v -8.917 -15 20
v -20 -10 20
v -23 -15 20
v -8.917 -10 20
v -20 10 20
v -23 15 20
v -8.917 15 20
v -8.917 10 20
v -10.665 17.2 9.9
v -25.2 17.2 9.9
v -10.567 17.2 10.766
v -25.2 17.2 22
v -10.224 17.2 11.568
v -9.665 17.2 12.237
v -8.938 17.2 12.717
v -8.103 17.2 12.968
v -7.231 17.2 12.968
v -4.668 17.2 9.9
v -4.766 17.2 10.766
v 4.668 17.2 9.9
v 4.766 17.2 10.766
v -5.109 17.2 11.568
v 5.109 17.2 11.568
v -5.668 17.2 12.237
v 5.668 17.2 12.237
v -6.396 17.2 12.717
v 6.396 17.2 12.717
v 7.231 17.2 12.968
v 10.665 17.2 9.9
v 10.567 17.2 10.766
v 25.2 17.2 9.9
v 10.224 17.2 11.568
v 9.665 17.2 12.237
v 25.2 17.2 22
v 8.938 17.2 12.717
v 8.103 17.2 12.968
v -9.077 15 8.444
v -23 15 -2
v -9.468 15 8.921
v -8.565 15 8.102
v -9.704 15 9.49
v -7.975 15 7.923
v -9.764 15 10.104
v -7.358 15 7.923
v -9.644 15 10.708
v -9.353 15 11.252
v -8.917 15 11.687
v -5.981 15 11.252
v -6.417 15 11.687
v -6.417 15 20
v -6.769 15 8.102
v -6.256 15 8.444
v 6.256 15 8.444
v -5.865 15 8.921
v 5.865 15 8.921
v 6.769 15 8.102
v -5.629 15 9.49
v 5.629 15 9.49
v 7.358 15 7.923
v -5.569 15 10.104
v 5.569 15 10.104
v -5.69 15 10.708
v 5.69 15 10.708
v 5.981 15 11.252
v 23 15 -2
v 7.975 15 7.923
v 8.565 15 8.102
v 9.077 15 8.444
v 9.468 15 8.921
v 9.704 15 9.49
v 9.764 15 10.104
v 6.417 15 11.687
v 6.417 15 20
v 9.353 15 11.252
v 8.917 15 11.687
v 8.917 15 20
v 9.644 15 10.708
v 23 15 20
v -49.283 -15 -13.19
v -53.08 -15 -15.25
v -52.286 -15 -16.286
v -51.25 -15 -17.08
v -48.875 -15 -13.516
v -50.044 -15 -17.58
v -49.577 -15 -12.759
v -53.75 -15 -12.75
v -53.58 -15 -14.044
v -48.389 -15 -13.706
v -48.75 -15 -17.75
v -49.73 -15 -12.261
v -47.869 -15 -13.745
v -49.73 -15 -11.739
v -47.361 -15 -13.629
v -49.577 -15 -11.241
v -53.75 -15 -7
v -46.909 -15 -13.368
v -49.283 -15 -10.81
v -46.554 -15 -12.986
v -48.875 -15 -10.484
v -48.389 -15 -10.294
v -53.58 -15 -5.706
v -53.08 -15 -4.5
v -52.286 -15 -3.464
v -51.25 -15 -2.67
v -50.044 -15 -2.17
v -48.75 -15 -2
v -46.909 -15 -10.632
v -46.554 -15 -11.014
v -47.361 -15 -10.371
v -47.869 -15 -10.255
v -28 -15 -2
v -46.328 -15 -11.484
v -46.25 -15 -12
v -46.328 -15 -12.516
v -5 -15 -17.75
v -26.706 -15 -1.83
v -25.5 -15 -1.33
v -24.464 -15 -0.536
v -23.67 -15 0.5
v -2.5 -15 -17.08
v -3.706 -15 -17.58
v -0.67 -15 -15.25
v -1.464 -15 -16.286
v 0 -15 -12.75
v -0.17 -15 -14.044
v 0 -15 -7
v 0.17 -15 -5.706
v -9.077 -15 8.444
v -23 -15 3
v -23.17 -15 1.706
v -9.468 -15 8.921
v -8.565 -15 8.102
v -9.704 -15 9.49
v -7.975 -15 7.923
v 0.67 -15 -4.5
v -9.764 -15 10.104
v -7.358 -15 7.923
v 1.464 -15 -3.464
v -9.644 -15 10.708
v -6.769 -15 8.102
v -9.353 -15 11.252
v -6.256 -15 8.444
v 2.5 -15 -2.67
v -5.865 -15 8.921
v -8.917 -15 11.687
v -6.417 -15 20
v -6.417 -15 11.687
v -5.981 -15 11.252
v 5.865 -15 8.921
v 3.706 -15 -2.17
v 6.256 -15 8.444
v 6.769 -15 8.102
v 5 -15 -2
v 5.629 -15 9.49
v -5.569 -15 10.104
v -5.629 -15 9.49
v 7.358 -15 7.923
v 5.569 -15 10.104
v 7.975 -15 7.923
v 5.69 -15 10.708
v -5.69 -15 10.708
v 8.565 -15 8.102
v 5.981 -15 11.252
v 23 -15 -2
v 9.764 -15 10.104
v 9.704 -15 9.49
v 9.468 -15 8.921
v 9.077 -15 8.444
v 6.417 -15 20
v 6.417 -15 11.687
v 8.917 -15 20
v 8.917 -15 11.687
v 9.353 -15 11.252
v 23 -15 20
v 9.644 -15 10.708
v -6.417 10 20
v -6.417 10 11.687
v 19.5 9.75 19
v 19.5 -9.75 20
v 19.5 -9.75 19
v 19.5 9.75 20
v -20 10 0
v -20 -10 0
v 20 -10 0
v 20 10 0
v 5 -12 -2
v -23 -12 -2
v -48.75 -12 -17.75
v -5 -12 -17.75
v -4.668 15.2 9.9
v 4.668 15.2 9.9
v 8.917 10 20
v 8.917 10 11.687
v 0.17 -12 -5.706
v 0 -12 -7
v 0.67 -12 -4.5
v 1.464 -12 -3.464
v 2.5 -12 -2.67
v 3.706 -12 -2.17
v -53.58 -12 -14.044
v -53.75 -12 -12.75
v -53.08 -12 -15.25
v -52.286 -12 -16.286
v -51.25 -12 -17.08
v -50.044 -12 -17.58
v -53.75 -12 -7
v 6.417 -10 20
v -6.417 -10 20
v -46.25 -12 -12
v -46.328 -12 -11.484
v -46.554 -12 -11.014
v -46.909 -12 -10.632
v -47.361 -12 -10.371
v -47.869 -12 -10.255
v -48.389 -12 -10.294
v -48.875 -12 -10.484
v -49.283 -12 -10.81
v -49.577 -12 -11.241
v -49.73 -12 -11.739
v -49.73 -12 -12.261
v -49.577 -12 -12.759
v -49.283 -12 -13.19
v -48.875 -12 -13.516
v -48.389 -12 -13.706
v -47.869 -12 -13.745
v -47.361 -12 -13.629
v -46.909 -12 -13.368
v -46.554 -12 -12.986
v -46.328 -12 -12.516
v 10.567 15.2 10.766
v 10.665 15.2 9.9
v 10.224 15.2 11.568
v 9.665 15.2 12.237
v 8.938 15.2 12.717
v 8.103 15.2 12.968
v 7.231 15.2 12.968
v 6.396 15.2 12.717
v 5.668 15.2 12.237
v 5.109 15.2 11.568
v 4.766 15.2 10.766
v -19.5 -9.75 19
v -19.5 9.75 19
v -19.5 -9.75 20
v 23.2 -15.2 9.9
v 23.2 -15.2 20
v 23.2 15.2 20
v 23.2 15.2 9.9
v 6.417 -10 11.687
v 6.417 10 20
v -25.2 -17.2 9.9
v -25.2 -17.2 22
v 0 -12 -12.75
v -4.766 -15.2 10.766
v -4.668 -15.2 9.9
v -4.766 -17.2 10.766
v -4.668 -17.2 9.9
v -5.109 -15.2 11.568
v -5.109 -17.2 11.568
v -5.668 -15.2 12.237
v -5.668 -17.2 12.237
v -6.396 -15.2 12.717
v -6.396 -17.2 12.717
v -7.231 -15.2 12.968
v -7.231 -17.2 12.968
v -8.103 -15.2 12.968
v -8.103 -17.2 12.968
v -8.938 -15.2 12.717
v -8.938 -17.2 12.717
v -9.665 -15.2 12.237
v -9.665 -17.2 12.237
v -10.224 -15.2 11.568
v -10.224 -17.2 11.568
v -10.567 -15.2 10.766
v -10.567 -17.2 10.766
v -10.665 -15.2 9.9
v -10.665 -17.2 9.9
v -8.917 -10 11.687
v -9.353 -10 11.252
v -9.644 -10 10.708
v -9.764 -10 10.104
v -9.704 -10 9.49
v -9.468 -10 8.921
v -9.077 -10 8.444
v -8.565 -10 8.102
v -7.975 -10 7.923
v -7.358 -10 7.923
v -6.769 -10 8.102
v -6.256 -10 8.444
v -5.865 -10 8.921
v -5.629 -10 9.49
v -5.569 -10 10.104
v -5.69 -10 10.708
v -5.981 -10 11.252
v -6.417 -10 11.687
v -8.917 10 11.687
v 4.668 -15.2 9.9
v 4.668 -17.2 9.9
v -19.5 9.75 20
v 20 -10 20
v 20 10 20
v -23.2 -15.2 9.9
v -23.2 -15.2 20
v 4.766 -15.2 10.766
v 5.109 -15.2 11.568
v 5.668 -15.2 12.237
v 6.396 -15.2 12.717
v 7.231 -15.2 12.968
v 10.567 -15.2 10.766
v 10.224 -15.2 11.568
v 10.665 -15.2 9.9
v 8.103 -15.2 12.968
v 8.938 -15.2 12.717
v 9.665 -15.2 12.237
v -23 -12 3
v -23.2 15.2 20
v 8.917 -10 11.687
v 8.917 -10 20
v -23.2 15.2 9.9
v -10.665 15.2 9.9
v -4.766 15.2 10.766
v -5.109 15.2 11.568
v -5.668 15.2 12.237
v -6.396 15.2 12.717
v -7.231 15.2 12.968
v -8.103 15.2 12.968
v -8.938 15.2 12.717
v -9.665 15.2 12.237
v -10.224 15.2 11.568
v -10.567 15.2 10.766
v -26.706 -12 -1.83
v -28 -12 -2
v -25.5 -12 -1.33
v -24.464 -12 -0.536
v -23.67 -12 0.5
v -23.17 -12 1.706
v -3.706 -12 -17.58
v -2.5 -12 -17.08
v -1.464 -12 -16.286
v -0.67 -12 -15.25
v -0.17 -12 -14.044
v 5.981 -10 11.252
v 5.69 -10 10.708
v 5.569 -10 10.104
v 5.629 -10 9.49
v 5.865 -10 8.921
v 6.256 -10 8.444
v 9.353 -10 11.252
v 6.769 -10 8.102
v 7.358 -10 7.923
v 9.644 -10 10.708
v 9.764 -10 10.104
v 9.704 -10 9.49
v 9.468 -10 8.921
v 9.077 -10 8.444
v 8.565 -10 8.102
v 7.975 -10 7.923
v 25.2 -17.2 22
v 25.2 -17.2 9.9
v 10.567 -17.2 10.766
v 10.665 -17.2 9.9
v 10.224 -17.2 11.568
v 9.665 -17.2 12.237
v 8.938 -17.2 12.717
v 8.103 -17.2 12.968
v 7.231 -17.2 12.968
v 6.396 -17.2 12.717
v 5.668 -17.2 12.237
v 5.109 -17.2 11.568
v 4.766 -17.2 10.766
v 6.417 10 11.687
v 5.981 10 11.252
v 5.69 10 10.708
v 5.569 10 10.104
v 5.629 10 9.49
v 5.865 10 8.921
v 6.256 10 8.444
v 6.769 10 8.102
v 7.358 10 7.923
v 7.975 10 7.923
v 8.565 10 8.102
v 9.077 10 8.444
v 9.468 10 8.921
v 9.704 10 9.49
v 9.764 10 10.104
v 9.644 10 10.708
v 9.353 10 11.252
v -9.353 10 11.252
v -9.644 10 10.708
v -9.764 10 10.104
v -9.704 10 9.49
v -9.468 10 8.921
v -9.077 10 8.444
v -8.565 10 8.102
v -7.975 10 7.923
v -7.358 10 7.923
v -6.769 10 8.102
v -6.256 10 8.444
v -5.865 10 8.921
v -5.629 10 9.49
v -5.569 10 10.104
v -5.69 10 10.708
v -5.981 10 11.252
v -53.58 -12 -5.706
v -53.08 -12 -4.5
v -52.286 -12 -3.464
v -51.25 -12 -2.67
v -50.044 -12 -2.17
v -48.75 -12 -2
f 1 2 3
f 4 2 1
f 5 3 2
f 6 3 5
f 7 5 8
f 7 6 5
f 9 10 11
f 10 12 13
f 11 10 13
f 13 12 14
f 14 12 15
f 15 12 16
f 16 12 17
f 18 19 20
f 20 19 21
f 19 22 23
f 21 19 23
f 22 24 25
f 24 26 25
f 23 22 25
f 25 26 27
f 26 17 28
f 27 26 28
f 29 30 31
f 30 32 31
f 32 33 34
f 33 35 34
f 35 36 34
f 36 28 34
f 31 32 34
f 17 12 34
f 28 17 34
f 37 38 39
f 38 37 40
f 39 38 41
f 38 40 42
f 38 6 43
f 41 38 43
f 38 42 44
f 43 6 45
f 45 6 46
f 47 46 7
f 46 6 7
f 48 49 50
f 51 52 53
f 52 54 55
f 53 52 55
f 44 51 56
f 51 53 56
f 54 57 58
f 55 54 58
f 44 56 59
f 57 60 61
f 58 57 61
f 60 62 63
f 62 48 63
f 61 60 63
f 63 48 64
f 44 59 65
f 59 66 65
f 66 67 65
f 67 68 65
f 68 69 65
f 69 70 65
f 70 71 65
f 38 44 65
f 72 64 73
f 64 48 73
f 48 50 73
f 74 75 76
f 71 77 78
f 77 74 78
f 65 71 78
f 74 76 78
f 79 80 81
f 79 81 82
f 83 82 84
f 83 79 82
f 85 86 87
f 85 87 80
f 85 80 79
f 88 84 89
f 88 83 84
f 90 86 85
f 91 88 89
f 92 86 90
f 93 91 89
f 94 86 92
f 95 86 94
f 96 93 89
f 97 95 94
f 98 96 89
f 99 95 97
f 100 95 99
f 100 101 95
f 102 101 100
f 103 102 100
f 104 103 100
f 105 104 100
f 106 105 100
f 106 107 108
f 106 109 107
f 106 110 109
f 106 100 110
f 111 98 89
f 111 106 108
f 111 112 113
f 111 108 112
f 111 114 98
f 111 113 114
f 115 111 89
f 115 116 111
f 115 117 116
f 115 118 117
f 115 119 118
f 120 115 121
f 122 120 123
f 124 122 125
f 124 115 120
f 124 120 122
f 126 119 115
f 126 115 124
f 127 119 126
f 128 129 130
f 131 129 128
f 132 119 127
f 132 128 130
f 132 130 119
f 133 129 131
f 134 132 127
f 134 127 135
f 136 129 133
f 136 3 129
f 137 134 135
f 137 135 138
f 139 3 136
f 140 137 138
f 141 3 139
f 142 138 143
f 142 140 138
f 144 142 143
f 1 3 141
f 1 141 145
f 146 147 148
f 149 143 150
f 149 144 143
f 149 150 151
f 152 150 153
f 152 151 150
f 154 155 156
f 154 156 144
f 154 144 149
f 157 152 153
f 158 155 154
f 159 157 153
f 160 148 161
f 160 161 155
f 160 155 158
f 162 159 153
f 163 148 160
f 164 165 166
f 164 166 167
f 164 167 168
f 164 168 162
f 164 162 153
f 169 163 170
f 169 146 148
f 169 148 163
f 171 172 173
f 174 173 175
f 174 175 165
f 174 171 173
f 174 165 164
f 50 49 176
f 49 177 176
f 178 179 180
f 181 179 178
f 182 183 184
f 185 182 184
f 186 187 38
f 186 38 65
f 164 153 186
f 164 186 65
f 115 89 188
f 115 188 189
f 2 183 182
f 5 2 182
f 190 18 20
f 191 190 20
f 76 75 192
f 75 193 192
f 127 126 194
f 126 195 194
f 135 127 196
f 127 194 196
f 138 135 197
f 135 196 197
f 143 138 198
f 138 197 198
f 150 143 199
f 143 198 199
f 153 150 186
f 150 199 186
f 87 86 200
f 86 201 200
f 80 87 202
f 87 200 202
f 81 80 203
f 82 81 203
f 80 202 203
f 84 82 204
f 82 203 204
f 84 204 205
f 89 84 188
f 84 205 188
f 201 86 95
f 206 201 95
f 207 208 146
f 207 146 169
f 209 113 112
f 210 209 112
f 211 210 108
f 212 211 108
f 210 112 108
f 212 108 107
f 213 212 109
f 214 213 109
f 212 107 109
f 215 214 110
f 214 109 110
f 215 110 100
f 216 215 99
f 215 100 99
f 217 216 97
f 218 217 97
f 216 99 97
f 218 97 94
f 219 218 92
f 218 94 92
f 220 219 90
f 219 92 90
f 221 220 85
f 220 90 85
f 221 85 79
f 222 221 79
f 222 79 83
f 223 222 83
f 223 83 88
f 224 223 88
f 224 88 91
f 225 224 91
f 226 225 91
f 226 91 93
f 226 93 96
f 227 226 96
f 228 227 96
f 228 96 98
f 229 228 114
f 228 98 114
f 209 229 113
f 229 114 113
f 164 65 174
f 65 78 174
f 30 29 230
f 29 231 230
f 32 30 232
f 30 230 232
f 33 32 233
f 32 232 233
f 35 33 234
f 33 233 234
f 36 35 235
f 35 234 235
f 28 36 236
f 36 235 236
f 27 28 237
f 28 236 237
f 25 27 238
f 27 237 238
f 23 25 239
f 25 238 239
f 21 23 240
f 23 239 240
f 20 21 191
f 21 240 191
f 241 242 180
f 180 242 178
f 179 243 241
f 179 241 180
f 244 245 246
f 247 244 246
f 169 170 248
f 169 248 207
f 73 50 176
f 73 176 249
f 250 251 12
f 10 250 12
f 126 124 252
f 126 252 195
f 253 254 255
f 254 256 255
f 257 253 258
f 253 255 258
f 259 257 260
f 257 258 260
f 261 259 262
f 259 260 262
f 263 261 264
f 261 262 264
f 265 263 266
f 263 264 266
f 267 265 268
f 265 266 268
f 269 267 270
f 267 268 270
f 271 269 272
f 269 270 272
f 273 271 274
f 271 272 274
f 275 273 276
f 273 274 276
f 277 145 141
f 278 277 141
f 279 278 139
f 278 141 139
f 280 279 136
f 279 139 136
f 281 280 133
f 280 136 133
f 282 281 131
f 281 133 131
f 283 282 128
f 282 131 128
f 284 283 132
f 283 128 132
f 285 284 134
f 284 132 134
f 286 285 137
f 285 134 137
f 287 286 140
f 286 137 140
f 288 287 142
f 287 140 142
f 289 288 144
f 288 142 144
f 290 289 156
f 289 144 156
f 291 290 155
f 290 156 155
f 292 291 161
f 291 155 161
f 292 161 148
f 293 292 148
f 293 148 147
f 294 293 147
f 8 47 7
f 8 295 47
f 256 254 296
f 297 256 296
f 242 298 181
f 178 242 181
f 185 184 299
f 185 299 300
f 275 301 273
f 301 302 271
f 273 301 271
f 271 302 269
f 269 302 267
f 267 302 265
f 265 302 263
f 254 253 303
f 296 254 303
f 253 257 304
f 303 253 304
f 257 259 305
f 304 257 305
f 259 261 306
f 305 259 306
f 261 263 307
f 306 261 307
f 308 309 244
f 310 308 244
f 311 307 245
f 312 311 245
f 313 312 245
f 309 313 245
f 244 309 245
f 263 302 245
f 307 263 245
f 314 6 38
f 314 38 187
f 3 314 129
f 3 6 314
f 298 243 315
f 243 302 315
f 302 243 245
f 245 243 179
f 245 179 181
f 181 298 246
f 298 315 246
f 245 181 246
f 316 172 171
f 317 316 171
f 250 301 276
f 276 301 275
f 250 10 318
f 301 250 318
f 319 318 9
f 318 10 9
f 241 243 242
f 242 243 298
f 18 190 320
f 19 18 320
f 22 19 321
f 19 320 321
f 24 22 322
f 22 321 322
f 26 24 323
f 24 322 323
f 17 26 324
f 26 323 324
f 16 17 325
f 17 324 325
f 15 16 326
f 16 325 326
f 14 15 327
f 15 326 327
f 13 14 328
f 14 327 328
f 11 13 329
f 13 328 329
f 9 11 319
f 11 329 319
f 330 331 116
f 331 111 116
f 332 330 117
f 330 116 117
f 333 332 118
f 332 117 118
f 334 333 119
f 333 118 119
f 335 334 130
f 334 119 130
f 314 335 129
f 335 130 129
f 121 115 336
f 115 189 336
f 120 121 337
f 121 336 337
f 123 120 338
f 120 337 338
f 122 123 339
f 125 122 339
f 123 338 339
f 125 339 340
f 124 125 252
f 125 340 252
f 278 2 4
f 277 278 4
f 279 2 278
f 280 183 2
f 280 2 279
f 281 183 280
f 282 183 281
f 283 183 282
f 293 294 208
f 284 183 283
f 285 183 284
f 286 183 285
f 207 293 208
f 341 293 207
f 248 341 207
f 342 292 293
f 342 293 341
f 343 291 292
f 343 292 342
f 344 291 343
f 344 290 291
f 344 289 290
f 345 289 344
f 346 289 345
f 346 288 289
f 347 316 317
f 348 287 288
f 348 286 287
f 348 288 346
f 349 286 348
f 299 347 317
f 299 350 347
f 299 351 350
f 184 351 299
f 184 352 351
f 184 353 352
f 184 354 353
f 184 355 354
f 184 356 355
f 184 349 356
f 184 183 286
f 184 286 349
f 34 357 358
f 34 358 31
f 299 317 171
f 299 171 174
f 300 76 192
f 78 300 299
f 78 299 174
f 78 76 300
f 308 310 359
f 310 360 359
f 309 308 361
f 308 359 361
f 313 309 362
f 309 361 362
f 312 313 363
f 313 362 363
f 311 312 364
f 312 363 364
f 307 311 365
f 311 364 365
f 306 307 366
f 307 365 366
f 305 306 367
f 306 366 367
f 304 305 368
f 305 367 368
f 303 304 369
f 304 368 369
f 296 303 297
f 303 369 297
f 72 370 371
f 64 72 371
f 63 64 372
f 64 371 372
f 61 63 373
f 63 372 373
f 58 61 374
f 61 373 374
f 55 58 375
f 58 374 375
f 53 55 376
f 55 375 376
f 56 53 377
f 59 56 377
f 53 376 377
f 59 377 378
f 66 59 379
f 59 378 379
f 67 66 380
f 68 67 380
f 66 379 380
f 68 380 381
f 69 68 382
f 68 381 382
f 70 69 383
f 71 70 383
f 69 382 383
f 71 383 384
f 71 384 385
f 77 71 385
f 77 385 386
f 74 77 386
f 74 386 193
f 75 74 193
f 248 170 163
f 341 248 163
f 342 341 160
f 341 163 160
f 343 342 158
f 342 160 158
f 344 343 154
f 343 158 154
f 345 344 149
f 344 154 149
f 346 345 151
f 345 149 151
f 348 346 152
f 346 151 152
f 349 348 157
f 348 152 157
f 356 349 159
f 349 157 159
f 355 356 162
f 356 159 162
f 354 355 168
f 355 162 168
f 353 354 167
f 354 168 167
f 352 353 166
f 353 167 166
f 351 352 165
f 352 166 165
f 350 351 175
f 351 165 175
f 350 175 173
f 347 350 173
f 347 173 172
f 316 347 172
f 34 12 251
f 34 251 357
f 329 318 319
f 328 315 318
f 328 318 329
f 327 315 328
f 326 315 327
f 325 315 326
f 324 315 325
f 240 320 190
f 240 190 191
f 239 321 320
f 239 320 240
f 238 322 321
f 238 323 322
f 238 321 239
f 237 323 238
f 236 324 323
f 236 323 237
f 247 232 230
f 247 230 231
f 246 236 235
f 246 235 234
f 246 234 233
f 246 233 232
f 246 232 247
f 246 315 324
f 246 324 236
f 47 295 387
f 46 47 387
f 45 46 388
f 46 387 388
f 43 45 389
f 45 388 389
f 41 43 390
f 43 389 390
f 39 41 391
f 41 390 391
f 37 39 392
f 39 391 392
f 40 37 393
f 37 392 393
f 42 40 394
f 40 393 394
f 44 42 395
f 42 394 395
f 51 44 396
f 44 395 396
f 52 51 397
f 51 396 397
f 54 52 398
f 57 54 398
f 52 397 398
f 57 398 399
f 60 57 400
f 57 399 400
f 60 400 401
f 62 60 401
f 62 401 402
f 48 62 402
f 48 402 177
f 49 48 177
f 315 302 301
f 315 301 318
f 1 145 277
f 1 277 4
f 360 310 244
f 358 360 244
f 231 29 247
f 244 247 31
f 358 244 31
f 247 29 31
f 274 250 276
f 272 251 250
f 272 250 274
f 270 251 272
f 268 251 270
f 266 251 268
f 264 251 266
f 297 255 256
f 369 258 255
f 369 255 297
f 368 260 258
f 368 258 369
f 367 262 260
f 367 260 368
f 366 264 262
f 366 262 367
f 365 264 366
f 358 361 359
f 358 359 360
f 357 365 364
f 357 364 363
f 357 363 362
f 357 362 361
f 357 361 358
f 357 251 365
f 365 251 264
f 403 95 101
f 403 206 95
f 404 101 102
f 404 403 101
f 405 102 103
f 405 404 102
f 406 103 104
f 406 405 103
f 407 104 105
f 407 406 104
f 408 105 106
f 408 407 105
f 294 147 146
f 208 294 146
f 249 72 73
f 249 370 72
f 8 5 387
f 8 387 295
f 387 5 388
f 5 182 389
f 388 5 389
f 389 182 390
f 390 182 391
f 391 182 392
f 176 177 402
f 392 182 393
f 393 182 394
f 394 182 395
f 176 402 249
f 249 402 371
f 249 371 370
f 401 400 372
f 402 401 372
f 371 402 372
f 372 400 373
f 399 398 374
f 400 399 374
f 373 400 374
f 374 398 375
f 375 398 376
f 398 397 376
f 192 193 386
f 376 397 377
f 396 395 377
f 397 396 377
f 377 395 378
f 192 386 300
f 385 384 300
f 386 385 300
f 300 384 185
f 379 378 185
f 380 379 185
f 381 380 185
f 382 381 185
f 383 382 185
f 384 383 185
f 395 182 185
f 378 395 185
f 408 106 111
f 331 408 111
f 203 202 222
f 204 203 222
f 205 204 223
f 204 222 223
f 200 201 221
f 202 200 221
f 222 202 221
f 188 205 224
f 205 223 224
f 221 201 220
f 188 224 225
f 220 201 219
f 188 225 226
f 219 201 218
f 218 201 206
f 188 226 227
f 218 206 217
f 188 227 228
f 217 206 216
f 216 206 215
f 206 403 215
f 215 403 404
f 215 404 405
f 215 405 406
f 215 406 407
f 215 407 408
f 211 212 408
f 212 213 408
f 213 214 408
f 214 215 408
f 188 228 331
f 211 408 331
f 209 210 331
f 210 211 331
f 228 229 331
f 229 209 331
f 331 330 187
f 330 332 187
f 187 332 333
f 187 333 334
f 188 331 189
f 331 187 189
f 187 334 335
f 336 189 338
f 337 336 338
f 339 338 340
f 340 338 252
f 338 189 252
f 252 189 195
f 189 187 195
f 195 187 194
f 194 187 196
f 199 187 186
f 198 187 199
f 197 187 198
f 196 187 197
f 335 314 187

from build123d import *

# Parameters (mm, degrees)
F0_W      = 46
F0_H      = 30
F0_W_2    = 40
F0_H_2    = 20
F1_DEPTH  = 20
F2_R      = 2.1
F3_DEPTH  = 30.001
F4_W      = 2.5
F4_H      = 13.7547671329
F5_DEPTH  = 30.001
F6_W      = 46
F6_H      = 30
F7_DEPTH  = 2
F8_W      = 53.75
F8_H      = 15.75
F8_R      = 1.75
F9_DEPTH  = 3
F10_R     = 5
F11_W     = 50.4
F11_H     = 34.4
F11_W_2   = 46.4
F11_H_2   = 30.4
F11_W_3   = 39
F11_H_3   = 19.5
F12_DEPTH = 2
F13_DEPTH = 1
F14_DEPTH = 10.1
F15_R     = 3
F16_DEPTH = 34.401


with BuildPart() as f1:
    # F0 (on Top) → F1 (new body)
    with BuildSketch(Plane.XY):
        Rectangle(F0_W, F0_H)
        Rectangle(F0_W_2, F0_H_2, mode=Mode.SUBTRACT)
    extrude(amount=F1_DEPTH)

    # F2 (on face) → F3 (cut, through all)
    with BuildSketch(Plane.XZ.offset(15)):
        with Locations((-7.6666666667, 10)):
            Circle(F2_R)
        with Locations((7.6666666667, 10)):
            Circle(F2_R)
    extrude(amount=-F3_DEPTH, mode=Mode.SUBTRACT)

    # F4 (on face) → F5 (cut, through all)
    with BuildSketch(Plane.XZ.offset(15)):
        with Locations((-7.6666666667, 16.8773835665)):
            Rectangle(F4_W, F4_H)
        with Locations((7.6666666667, 16.8773835665)):
            Rectangle(F4_W, F4_H)
    extrude(amount=-F5_DEPTH, mode=Mode.SUBTRACT)

    # F6 (on face) → F7 (join)
    with BuildSketch(Plane(origin=(0, 0, 0), x_dir=(1, 0, 0), z_dir=(0, 0, -1))):
        Rectangle(F6_W, F6_H)
    extrude(amount=F7_DEPTH)

    # F8 (on face) → F9 (join)
    with BuildSketch(Plane.XZ.offset(15)):
        with Locations((-26.875, -9.875)):
            Rectangle(F8_W, F8_H)
        with Locations((-48, -12)):
            Circle(F8_R, mode=Mode.SUBTRACT)
    extrude(amount=-F9_DEPTH)

    # F10
    f10_edges = [f1.edges().sort_by_distance(p)[0] for p in [
        (-53.75, -13.5, -2),
        (-53.75, -13.5, -17.75),
        (-23, -13.5, -2),
        (0, -13.5, -2),
        (0, -13.5, -17.75),
    ]]
    fillet(f10_edges, radius=F10_R)


with BuildPart() as f12:
    # F11 (on face) → F12 (new body)
    with BuildSketch(Plane.XY.offset(20)):
        Rectangle(F11_W, F11_H)
        Rectangle(F11_W_2, F11_H_2, mode=Mode.SUBTRACT)
        Rectangle(F11_W_2, F11_H_2)
        Polygon((-8.9166666667, 15), (-8.9166666667, 10), (-20, 10), (-20, -10), (-8.9166666667, -10), (-8.9166666667, -15), (-23, -15), (-23, 15), align=None, mode=Mode.SUBTRACT)
        Rectangle(F11_W_3, F11_H_3, mode=Mode.SUBTRACT)
        Rectangle(F11_W_3, F11_H_3)
        Polygon((-20, 10), (-8.9166666667, 10), (-8.9166666667, 15), (-23, 15), (-23, -15), (-8.9166666667, -15), (-8.9166666667, -10), (-20, -10), align=None)
    extrude(amount=F12_DEPTH)

    # F11 (on face) → F13 (join)
    with BuildSketch(Plane.XY.offset(20)):
        Rectangle(F11_W_3, F11_H_3)
    extrude(amount=-F13_DEPTH)

    # F11 (on face) → F14 (join)
    with BuildSketch(Plane.XY.offset(20)):
        Rectangle(F11_W, F11_H)
        Rectangle(F11_W_2, F11_H_2, mode=Mode.SUBTRACT)
    extrude(amount=-F14_DEPTH)

    # F15 (on face) → F16 (cut, through all)
    with BuildSketch(Plane.XZ.offset(17.2)):
        with Locations((-7.6666666667, 10)):
            Circle(F15_R)
        with Locations((7.6666666667, 10)):
            Circle(F15_R)
    extrude(amount=-F16_DEPTH, mode=Mode.SUBTRACT)


solid = Compound([f1.part, f12.part])
